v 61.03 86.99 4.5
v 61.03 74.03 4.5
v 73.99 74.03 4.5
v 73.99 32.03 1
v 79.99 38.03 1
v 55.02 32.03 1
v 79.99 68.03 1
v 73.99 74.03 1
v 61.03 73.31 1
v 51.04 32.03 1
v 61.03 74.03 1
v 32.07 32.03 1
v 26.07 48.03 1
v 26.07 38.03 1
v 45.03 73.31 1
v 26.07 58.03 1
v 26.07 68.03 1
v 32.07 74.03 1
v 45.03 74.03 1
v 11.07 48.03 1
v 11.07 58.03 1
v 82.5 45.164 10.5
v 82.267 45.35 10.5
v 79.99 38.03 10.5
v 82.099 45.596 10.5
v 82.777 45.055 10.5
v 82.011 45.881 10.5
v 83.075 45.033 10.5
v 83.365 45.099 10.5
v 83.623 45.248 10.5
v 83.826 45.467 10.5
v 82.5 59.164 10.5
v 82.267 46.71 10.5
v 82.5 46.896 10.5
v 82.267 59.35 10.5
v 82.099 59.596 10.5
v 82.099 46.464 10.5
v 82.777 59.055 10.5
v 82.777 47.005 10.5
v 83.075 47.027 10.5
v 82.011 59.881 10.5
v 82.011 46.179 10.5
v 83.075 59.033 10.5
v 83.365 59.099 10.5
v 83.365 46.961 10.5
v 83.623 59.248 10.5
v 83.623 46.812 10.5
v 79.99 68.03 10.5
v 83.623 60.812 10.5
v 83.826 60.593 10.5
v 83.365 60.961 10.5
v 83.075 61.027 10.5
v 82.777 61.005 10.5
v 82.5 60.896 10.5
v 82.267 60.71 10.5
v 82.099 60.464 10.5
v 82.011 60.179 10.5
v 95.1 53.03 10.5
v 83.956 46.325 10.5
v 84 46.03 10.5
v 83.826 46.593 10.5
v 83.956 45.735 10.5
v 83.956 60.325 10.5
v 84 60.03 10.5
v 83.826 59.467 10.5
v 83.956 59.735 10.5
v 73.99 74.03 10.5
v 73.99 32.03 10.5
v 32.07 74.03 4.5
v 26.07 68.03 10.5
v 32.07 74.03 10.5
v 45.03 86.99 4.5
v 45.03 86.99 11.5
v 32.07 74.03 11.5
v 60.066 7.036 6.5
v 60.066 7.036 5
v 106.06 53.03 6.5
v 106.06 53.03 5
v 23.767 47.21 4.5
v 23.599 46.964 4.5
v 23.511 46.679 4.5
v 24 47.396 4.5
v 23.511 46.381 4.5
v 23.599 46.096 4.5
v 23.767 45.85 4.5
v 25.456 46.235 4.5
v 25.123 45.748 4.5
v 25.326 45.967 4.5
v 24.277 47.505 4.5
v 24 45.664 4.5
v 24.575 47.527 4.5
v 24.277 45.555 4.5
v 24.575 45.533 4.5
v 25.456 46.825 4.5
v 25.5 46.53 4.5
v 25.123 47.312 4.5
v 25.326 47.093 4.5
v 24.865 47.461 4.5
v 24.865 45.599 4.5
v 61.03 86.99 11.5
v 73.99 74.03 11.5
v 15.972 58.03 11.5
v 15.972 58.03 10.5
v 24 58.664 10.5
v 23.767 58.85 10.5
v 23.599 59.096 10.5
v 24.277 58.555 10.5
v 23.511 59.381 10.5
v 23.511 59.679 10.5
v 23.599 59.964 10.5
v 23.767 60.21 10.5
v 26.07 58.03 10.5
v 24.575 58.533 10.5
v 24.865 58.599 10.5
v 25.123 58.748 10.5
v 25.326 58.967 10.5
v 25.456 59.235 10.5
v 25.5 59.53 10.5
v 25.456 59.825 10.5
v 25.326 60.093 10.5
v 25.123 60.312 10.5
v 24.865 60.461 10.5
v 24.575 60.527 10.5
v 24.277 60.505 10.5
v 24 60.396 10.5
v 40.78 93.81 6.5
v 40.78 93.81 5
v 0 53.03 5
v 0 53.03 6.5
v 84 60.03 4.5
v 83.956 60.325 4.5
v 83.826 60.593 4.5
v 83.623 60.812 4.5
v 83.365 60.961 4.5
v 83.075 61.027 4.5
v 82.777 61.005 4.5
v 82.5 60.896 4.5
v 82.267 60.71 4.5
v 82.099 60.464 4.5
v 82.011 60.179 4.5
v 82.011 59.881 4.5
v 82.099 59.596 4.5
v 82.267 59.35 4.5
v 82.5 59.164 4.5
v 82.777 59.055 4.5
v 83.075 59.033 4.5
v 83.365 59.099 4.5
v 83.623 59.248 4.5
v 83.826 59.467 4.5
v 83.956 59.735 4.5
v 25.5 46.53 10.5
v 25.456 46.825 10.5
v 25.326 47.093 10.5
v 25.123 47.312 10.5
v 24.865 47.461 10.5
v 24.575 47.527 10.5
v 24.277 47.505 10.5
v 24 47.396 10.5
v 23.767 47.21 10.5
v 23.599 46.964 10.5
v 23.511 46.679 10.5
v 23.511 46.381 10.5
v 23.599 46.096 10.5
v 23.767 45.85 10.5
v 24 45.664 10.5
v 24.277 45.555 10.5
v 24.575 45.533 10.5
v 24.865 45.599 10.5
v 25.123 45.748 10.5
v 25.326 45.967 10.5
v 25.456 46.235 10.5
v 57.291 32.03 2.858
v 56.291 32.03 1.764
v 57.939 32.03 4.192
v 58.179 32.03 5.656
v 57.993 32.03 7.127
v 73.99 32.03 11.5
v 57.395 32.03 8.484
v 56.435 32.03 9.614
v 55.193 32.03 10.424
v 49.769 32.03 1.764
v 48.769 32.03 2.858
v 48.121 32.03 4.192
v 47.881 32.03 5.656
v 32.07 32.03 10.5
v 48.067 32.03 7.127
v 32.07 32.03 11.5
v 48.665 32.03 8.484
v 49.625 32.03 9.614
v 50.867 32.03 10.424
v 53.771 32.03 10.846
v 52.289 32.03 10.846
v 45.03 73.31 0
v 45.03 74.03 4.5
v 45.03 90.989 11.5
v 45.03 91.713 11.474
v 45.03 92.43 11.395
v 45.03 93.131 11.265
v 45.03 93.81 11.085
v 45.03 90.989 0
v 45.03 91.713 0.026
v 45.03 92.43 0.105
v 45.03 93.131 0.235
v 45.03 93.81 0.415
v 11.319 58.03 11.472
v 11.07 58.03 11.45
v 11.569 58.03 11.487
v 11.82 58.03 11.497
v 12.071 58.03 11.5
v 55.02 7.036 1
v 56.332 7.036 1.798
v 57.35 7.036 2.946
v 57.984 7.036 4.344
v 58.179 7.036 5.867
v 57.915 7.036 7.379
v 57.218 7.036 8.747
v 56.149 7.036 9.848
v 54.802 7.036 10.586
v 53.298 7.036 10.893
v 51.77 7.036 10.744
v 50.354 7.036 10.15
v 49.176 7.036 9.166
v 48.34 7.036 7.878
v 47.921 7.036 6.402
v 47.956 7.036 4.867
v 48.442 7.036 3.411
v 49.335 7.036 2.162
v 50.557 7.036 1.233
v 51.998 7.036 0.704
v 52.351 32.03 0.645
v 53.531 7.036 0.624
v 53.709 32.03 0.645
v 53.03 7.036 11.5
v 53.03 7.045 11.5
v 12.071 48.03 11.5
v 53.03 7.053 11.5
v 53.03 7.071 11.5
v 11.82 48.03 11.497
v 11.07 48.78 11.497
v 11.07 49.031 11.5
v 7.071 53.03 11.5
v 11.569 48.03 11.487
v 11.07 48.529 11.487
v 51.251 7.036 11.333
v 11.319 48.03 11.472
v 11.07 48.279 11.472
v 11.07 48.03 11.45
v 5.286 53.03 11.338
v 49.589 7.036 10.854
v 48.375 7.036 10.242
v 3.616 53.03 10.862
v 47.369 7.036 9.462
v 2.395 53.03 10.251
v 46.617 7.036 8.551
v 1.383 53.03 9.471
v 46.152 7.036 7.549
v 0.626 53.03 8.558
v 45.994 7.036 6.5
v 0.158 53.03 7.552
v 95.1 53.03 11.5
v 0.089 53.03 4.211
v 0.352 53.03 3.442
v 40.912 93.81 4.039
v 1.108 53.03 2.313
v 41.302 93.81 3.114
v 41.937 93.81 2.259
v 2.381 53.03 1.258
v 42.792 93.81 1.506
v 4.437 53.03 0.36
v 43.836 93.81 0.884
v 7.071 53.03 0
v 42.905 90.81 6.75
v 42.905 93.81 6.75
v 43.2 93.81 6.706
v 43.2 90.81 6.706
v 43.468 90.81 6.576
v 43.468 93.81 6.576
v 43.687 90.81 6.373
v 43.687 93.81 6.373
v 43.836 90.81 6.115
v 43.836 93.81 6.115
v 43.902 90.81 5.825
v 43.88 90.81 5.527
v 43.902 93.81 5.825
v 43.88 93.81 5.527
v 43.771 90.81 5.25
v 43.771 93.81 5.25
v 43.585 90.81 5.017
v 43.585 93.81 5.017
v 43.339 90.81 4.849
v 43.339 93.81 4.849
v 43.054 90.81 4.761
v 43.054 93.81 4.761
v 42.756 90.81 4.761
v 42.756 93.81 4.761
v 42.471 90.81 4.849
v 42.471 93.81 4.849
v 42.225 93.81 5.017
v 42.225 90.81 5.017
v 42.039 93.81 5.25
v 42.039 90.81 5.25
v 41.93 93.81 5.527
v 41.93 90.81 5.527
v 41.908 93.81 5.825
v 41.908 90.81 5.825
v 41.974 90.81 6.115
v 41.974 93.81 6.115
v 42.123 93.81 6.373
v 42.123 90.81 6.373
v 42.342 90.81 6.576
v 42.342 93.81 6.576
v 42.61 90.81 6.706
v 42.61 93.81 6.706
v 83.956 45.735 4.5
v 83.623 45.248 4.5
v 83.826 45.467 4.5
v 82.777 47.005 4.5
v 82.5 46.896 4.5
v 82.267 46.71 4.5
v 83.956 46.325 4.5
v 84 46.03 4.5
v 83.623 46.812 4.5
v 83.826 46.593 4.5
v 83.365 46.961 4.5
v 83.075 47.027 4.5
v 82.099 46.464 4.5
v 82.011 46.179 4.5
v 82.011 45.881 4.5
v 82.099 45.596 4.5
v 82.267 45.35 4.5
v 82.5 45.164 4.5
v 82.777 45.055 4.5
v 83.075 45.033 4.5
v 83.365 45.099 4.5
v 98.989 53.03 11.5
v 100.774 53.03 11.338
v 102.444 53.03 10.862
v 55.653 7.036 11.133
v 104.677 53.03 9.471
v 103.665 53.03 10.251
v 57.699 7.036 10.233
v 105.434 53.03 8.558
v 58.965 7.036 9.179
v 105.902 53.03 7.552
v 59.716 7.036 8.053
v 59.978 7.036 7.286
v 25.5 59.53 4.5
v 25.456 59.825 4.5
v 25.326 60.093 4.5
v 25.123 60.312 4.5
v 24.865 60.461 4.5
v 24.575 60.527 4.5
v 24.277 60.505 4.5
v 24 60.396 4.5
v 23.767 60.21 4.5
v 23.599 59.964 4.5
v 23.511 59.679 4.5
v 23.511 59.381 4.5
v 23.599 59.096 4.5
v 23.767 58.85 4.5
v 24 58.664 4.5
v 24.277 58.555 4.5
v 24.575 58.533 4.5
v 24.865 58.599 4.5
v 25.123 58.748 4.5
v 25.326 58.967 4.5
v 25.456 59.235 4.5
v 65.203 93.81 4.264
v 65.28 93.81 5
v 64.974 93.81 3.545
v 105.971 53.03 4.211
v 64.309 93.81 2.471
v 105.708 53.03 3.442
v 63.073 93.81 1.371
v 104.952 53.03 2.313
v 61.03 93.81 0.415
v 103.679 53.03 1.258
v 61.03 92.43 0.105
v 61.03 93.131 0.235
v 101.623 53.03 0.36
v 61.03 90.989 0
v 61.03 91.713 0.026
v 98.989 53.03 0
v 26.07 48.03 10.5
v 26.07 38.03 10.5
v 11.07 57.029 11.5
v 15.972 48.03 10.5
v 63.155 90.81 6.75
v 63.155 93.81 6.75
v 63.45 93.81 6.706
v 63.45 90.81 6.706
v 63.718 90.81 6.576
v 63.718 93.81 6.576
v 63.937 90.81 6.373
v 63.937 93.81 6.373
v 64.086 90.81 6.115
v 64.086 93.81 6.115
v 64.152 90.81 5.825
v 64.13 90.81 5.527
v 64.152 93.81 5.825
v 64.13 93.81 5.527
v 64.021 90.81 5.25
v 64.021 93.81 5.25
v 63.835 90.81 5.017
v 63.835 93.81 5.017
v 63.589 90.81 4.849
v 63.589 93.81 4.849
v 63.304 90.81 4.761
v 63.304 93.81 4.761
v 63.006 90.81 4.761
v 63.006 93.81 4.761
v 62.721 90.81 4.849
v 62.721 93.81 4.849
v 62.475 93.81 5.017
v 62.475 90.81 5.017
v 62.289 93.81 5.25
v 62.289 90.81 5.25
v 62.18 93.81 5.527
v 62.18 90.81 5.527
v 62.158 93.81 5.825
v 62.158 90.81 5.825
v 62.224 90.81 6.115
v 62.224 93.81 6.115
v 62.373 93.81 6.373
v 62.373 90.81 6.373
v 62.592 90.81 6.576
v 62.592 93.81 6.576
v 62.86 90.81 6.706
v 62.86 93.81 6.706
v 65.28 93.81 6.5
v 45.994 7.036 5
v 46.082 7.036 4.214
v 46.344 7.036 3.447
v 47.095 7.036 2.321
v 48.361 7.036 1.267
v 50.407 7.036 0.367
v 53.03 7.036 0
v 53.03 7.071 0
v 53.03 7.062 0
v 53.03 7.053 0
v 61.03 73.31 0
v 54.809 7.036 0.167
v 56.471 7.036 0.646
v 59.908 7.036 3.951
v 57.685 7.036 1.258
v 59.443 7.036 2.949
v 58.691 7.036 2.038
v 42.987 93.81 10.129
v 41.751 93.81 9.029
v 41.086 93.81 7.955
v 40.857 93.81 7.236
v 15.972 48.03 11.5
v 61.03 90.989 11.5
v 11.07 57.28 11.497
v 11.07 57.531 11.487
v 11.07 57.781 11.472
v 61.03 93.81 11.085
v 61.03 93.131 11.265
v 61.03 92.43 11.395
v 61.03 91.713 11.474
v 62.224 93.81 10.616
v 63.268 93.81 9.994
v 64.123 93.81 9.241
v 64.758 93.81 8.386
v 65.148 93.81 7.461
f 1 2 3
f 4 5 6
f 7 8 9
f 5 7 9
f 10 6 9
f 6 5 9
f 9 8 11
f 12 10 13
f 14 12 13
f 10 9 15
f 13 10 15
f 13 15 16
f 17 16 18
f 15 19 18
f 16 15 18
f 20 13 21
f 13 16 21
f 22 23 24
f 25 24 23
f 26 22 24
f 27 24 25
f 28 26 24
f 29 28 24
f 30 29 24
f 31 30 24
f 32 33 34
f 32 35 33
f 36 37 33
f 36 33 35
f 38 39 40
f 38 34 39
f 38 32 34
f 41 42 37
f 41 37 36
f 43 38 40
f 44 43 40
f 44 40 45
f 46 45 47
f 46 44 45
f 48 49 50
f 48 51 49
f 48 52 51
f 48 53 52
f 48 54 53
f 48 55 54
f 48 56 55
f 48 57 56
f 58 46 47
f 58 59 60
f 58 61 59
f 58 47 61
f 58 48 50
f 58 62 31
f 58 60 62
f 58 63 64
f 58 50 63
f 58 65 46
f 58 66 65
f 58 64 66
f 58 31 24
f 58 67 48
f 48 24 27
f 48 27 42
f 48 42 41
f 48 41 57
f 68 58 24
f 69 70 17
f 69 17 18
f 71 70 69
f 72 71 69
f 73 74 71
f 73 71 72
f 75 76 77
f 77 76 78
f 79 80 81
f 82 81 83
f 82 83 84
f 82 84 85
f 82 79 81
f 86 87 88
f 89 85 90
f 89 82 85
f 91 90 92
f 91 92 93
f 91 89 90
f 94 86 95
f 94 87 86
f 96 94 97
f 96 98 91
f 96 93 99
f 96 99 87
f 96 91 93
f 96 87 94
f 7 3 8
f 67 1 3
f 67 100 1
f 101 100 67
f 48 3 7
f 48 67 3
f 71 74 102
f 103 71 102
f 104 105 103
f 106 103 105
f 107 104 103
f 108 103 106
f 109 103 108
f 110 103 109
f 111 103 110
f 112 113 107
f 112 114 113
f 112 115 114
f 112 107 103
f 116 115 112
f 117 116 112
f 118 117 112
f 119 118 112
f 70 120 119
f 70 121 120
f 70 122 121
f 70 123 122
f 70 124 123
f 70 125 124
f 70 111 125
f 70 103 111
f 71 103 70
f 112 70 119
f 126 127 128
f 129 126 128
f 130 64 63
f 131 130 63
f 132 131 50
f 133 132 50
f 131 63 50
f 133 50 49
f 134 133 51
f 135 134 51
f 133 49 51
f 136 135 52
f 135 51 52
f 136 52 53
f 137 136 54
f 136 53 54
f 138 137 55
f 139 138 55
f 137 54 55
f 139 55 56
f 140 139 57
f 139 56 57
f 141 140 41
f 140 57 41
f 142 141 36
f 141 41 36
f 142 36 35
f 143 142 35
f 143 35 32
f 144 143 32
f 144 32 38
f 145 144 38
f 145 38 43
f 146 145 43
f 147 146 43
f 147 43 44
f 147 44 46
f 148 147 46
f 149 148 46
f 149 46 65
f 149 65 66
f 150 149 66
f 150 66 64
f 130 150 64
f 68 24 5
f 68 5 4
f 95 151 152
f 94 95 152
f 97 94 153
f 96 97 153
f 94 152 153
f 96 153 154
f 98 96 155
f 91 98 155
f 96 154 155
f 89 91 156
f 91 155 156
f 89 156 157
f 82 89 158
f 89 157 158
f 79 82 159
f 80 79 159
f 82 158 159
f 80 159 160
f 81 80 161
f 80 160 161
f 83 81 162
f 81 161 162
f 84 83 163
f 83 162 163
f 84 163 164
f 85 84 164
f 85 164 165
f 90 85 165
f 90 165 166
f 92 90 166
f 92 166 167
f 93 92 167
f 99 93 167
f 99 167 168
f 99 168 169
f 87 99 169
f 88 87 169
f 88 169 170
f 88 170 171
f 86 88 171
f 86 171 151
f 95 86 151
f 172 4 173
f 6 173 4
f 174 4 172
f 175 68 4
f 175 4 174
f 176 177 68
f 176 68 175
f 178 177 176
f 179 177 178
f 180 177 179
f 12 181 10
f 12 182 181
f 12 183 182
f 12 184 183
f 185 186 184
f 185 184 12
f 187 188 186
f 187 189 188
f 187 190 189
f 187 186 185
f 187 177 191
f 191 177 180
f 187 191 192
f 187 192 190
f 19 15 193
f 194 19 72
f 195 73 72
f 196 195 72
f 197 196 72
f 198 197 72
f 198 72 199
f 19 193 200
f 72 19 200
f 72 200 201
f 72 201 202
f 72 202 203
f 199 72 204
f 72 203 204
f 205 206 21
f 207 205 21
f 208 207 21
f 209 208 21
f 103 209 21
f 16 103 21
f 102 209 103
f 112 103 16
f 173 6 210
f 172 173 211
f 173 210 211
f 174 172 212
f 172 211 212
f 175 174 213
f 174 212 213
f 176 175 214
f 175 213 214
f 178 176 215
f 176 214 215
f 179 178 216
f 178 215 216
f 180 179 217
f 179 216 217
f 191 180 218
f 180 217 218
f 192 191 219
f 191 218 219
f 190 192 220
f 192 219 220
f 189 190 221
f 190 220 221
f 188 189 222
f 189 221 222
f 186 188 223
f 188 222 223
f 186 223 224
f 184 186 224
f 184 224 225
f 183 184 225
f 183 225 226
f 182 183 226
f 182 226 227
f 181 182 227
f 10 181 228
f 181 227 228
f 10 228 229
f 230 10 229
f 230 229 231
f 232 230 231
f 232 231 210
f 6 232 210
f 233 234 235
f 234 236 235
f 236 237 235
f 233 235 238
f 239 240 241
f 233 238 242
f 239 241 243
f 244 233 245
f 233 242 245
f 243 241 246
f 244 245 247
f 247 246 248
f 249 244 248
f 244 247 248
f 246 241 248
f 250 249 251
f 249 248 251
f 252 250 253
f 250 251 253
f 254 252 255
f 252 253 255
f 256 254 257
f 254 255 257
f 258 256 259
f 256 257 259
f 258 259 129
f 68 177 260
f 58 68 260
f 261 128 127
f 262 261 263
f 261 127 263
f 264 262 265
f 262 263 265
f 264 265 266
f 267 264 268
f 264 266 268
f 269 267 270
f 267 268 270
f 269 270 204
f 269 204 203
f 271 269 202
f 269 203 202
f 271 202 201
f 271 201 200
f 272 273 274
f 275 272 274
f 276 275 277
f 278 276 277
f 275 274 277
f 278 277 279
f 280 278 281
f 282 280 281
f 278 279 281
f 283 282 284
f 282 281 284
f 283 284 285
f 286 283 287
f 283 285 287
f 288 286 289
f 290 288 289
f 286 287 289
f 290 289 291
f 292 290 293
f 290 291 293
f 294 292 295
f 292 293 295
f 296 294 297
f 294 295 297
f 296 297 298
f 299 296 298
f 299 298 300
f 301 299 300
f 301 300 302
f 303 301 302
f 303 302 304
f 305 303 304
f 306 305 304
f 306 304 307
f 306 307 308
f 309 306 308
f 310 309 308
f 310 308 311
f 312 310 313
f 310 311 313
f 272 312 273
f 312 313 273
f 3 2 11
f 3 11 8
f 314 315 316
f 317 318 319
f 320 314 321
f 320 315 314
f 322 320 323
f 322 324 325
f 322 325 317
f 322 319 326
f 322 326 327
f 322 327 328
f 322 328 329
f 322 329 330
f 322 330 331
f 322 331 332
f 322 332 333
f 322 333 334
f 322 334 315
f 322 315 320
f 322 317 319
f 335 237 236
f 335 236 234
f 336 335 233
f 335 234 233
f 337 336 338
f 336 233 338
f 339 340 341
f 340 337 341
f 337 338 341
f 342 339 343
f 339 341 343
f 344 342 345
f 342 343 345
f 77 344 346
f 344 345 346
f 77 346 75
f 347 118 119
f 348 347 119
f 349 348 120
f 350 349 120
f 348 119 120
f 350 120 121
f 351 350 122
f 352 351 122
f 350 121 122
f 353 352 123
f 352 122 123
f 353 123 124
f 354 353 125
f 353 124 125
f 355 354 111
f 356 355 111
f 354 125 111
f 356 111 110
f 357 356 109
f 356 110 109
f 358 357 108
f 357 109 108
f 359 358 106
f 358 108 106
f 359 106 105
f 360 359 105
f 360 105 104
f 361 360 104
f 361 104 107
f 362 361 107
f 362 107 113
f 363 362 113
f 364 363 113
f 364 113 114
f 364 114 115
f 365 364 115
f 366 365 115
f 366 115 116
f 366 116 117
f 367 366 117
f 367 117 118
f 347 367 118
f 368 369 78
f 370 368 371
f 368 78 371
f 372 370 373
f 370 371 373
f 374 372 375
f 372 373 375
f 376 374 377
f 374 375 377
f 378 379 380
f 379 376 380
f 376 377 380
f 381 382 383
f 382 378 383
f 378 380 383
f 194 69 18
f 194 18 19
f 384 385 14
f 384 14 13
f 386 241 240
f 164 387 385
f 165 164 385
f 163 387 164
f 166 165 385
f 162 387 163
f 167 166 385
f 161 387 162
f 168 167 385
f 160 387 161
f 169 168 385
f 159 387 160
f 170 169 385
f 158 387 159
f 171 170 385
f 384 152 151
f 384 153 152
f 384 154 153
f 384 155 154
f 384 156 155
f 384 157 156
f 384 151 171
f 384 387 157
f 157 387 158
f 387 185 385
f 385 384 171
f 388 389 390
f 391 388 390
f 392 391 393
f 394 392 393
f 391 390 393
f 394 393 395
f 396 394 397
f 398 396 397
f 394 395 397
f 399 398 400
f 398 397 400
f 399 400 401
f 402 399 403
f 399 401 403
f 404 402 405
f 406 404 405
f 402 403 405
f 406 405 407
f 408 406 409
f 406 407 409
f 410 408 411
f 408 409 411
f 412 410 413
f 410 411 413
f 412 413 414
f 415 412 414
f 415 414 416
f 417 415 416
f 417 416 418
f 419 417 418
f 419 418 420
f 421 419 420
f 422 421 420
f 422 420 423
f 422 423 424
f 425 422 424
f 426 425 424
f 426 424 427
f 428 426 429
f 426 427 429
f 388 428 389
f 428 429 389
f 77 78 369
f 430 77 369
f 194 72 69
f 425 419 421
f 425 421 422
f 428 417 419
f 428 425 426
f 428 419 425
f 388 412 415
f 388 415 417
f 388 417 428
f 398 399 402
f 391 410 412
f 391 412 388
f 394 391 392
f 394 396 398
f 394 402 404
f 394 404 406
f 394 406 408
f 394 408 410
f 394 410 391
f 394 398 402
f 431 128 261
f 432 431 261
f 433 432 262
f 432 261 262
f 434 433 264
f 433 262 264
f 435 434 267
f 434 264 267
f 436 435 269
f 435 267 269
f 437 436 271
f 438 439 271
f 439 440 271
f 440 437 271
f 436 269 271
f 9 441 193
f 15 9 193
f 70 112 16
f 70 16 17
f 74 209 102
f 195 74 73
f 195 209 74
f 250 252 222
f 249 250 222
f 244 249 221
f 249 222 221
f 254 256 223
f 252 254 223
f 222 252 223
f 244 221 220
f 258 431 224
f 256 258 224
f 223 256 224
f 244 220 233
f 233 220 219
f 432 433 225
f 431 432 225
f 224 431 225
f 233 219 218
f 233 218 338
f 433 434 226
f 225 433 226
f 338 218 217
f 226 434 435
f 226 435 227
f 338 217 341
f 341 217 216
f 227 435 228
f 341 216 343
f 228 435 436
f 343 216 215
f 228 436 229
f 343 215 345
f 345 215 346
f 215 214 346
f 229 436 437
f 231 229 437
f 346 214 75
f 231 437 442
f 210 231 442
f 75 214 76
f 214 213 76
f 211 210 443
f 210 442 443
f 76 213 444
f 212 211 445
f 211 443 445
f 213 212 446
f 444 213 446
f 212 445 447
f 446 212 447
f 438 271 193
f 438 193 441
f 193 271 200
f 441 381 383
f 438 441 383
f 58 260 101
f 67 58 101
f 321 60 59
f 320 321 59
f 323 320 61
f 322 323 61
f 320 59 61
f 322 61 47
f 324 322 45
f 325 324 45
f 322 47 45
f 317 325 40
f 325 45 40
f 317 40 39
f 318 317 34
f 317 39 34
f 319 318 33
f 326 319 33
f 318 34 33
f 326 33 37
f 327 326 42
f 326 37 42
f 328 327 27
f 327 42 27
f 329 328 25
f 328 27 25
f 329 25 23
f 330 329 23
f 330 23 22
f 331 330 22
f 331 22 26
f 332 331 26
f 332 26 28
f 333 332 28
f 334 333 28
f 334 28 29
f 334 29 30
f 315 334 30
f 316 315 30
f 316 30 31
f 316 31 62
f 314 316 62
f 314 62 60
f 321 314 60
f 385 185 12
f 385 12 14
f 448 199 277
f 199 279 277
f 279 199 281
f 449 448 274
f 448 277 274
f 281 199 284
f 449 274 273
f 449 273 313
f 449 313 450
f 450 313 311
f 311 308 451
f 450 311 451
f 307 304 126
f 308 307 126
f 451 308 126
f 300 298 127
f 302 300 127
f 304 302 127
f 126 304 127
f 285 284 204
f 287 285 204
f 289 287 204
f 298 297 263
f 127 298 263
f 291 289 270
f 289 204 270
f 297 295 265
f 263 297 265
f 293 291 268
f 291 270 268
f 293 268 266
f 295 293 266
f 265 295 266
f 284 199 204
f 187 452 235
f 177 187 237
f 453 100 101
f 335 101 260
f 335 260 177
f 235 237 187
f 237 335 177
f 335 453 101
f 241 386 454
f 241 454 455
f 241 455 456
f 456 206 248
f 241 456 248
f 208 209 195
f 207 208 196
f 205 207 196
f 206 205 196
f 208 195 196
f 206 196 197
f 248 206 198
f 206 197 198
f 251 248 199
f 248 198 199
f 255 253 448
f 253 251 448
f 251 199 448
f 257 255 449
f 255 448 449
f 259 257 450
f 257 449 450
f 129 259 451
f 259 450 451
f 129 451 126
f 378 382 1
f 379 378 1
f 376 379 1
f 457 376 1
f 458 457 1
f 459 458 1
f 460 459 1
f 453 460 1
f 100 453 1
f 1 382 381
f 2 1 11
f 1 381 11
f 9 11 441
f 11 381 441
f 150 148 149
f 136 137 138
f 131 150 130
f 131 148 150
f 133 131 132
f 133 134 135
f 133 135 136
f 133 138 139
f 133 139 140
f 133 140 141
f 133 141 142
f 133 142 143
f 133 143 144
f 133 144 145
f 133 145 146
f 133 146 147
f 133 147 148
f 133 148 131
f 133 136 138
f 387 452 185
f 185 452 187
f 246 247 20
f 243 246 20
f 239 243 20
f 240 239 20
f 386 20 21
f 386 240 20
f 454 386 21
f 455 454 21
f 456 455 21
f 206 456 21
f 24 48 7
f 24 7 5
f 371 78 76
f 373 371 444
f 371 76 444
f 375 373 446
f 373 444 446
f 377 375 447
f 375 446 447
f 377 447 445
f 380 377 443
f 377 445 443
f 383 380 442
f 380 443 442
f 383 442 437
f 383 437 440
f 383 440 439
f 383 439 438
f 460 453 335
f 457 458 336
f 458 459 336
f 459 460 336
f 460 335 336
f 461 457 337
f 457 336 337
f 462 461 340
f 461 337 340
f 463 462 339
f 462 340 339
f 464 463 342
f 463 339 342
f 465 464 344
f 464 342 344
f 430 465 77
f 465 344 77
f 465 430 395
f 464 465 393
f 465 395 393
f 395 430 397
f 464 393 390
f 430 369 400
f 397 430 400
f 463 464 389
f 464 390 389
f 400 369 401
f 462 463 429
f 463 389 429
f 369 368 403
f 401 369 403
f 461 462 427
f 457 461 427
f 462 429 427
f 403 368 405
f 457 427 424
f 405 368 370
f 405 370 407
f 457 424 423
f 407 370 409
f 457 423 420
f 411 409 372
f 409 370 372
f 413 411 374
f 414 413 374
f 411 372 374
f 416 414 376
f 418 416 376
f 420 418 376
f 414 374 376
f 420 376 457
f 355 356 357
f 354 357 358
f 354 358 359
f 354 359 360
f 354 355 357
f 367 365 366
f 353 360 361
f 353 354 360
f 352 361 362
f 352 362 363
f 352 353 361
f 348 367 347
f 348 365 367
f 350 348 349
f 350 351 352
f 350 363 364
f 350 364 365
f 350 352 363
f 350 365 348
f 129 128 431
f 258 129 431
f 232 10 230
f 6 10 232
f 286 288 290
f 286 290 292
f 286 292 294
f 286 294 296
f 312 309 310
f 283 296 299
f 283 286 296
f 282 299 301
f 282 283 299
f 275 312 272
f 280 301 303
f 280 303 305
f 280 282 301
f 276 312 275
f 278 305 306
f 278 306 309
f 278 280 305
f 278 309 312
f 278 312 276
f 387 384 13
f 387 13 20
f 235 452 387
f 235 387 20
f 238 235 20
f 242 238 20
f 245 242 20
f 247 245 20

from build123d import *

# Parameters (mm, degrees)
BOSS_EXTRUDE1_DEPTH = 11.5
CUT_EXTRUDE1_DEPTH  = 10.5
CUT_EXTRUDE3_START  = 93.81
SKETCH10_R          = 1
CUT_EXTRUDE3_DEPTH  = 3
SKETCH11_R          = 5.15
CUT_EXTRUDE4_DEPTH  = 28.407206753
CUT_EXTRUDE6_START  = 11.5
CUT_EXTRUDE6_DEPTH  = 7
CUT_EXTRUDE10_START = 11.5
SKETCH17_R          = 1
CUT_EXTRUDE10_DEPTH = 7
CUT_EXTRUDE11_START = 11.5
CUT_EXTRUDE11_DEPTH = 1
FILLET1_R           = 5
FILLET2_R           = 5
SKETCH22_W          = 132.319501334
SKETCH22_H          = 14.071427362
CUT_EXTRUDE13_DEPTH = 143.060866263


with BuildPart() as part:
    # Sketch1 → Boss-Extrude1 (new body)
    with BuildSketch(Plane.XY):
        Polygon((0, 53.03), (49.407206753, 3.622793247), (56.652793247, 3.622793247), (106.06, 53.03), (65.28, 93.81), (61.03, 93.81), (61.03, 73.31), (45.03, 73.31), (45.03, 93.81), (40.78, 93.81), align=None)
    extrude(amount=BOSS_EXTRUDE1_DEPTH)

    # Sketch5 → Cut-Extrude1 (cut)
    with BuildSketch(Plane.XY.offset(11.5)):
        Polygon((26.07, 68.03), (32.07, 74.03), (73.99, 74.03), (79.99, 68.03), (79.99, 38.03), (73.99, 32.03), (32.07, 32.03), (26.07, 38.03), (26.07, 48.03), (11.07, 48.03), (11.07, 58.03), (26.07, 58.03), align=None)
    extrude(amount=-CUT_EXTRUDE1_DEPTH, mode=Mode.SUBTRACT)

    # Sketch10 → Cut-Extrude3 (cut)
    with BuildSketch(Plane(origin=(0, 0, 0), x_dir=(1, 0, 0), z_dir=(0, 1, 0)).offset(CUT_EXTRUDE3_START)):
        with Locations(Location((42.905, -5.75, 0), (0, 0, 270))):
            Circle(SKETCH10_R)
        with Locations(Location((63.155, -5.75, 0), (0, 0, 270))):
            Circle(SKETCH10_R)
    extrude(amount=-CUT_EXTRUDE3_DEPTH, mode=Mode.SUBTRACT)

    # Sketch11 → Cut-Extrude4 (cut)
    with BuildSketch(Plane.XZ.offset(-3.622793247)):
        with Locations(Location((53.03, 5.75, 0), (0, 0, 292.730860927))):
            Circle(SKETCH11_R)
    extrude(amount=-CUT_EXTRUDE4_DEPTH, mode=Mode.SUBTRACT)

    # Sketch13 → Cut-Extrude6 (cut)
    with BuildSketch(Plane.XY.offset(CUT_EXTRUDE6_START)):
        Polygon((73.99, 74.03), (61.03, 86.99), (61.03, 74.03), align=None)
        Polygon((32.07, 74.03), (45.03, 86.99), (45.03, 74.03), align=None)
    extrude(amount=-CUT_EXTRUDE6_DEPTH, mode=Mode.SUBTRACT)

    # Sketch17 → Cut-Extrude10 (cut)
    with BuildSketch(Plane.XY.offset(CUT_EXTRUDE10_START)):
        with Locations((24.5, 59.53)):
            Circle(SKETCH17_R)
        with Locations((24.5, 46.53)):
            Circle(SKETCH17_R)
        with Locations((83, 60.03)):
            Circle(SKETCH17_R)
        with Locations((83, 46.03)):
            Circle(SKETCH17_R)
    extrude(amount=-CUT_EXTRUDE10_DEPTH, mode=Mode.SUBTRACT)

    # Sketch19 → Cut-Extrude11 (cut)
    with BuildSketch(Plane.XY.offset(CUT_EXTRUDE11_START)):
        Polygon((13.96, 56.03), (13.96, 50.03), (32.07, 32.03), (73.99, 32.03), (95.1, 53.03), (73.99, 74.03), (32.07, 74.03), align=None)
    extrude(amount=-CUT_EXTRUDE11_DEPTH, mode=Mode.SUBTRACT)

    # Fillet1
    # the kernel refuses this fillet: 5 mm, written as the material it takes off along each edge
    with BuildSketch(Plane(origin=(47.813958483, -5.216041517, 11.5), x_dir=(0, 0, -1), z_dir=(0.7071067811865475, 0.7071067811865477, 0)), Plane(origin=(-8.838834765, 61.868834765, 11.5), x_dir=(0, 0, -1), z_dir=(0.7071067811865476, -0.7071067811865475, 0))) as fillet1_piece_1:
        with BuildLine():
            CenterArc((FILLET1_R, FILLET1_R), FILLET1_R, 180, 90)
            Line((0, FILLET1_R), (0, 0))
            Line((0, 0), (FILLET1_R, 0))
        make_face()
    extrude(amount=94.872341868, mode=Mode.SUBTRACT)
    with BuildSketch(Plane(origin=(49.618834765, 102.648834765, 11.5), x_dir=(0, 0, -1), z_dir=(-0.7071067811865472, -0.7071067811865479, 0)), Plane(origin=(114.898834765, 44.191165235, 11.5), x_dir=(0, 0, -1), z_dir=(-0.7071067811865476, 0.7071067811865476, 0))) as fillet1_piece_2:
        with BuildLine():
            CenterArc((FILLET1_R, FILLET1_R), FILLET1_R, 180, 90)
            Line((0, FILLET1_R), (0, 0))
            Line((0, 0), (FILLET1_R, 0))
        make_face()
    extrude(amount=82.671629074, mode=Mode.SUBTRACT)

    # Fillet2
    # the kernel refuses this fillet: 5 mm, written as the material it takes off along each edge
    with BuildSketch(Plane(origin=(49.618834765, 102.648834765, 0), x_dir=(0.7071067811865479, -0.7071067811865472, 0), z_dir=(-0.7071067811865472, -0.7071067811865479, 0)), Plane(origin=(114.898834765, 44.191165235, 0), x_dir=(-0.7071067811865476, -0.7071067811865476, 0), z_dir=(-0.7071067811865476, 0.7071067811865476, 0))) as fillet2_piece_1:
        with BuildLine():
            CenterArc((FILLET2_R, FILLET2_R), FILLET2_R, 180, 90)
            Line((0, FILLET2_R), (0, 0))
            Line((0, 0), (FILLET2_R, 0))
        make_face()
    extrude(amount=82.671629074, mode=Mode.SUBTRACT)
    with BuildSketch(Plane(origin=(-8.838834765, 61.868834765, 0), x_dir=(0, 0, 1), z_dir=(0.7071067811865476, -0.7071067811865475, 0))) as fillet2_piece_2:
        with BuildLine():
            CenterArc((FILLET2_R, -FILLET2_R), FILLET2_R, 90, 90)
            Line((0, -FILLET2_R), (0, 0))
            Line((0, 0), (FILLET2_R, 0))
        make_face()
    extrude(amount=94.872341868, mode=Mode.SUBTRACT)
    with BuildSketch(Plane(origin=(47.813958483, -5.216041517, 0), x_dir=(-0.7071067811865477, 0.7071067811865475, 0), z_dir=(0.7071067811865475, 0.7071067811865477, 0))) as fillet2_piece_3:
        with BuildLine():
            CenterArc((FILLET2_R, FILLET2_R), FILLET2_R, 180, 90)
            Line((0, FILLET2_R), (0, 0))
            Line((0, 0), (FILLET2_R, 0))
        make_face()
    extrude(amount=94.872341868, mode=Mode.SUBTRACT)

    # Sketch22 → Cut-Extrude13 (cut, through all)
    with BuildSketch(Plane.XY):
        Rectangle(SKETCH22_W, SKETCH22_H)
    extrude(amount=CUT_EXTRUDE13_DEPTH, mode=Mode.SUBTRACT)


solid = part.part
